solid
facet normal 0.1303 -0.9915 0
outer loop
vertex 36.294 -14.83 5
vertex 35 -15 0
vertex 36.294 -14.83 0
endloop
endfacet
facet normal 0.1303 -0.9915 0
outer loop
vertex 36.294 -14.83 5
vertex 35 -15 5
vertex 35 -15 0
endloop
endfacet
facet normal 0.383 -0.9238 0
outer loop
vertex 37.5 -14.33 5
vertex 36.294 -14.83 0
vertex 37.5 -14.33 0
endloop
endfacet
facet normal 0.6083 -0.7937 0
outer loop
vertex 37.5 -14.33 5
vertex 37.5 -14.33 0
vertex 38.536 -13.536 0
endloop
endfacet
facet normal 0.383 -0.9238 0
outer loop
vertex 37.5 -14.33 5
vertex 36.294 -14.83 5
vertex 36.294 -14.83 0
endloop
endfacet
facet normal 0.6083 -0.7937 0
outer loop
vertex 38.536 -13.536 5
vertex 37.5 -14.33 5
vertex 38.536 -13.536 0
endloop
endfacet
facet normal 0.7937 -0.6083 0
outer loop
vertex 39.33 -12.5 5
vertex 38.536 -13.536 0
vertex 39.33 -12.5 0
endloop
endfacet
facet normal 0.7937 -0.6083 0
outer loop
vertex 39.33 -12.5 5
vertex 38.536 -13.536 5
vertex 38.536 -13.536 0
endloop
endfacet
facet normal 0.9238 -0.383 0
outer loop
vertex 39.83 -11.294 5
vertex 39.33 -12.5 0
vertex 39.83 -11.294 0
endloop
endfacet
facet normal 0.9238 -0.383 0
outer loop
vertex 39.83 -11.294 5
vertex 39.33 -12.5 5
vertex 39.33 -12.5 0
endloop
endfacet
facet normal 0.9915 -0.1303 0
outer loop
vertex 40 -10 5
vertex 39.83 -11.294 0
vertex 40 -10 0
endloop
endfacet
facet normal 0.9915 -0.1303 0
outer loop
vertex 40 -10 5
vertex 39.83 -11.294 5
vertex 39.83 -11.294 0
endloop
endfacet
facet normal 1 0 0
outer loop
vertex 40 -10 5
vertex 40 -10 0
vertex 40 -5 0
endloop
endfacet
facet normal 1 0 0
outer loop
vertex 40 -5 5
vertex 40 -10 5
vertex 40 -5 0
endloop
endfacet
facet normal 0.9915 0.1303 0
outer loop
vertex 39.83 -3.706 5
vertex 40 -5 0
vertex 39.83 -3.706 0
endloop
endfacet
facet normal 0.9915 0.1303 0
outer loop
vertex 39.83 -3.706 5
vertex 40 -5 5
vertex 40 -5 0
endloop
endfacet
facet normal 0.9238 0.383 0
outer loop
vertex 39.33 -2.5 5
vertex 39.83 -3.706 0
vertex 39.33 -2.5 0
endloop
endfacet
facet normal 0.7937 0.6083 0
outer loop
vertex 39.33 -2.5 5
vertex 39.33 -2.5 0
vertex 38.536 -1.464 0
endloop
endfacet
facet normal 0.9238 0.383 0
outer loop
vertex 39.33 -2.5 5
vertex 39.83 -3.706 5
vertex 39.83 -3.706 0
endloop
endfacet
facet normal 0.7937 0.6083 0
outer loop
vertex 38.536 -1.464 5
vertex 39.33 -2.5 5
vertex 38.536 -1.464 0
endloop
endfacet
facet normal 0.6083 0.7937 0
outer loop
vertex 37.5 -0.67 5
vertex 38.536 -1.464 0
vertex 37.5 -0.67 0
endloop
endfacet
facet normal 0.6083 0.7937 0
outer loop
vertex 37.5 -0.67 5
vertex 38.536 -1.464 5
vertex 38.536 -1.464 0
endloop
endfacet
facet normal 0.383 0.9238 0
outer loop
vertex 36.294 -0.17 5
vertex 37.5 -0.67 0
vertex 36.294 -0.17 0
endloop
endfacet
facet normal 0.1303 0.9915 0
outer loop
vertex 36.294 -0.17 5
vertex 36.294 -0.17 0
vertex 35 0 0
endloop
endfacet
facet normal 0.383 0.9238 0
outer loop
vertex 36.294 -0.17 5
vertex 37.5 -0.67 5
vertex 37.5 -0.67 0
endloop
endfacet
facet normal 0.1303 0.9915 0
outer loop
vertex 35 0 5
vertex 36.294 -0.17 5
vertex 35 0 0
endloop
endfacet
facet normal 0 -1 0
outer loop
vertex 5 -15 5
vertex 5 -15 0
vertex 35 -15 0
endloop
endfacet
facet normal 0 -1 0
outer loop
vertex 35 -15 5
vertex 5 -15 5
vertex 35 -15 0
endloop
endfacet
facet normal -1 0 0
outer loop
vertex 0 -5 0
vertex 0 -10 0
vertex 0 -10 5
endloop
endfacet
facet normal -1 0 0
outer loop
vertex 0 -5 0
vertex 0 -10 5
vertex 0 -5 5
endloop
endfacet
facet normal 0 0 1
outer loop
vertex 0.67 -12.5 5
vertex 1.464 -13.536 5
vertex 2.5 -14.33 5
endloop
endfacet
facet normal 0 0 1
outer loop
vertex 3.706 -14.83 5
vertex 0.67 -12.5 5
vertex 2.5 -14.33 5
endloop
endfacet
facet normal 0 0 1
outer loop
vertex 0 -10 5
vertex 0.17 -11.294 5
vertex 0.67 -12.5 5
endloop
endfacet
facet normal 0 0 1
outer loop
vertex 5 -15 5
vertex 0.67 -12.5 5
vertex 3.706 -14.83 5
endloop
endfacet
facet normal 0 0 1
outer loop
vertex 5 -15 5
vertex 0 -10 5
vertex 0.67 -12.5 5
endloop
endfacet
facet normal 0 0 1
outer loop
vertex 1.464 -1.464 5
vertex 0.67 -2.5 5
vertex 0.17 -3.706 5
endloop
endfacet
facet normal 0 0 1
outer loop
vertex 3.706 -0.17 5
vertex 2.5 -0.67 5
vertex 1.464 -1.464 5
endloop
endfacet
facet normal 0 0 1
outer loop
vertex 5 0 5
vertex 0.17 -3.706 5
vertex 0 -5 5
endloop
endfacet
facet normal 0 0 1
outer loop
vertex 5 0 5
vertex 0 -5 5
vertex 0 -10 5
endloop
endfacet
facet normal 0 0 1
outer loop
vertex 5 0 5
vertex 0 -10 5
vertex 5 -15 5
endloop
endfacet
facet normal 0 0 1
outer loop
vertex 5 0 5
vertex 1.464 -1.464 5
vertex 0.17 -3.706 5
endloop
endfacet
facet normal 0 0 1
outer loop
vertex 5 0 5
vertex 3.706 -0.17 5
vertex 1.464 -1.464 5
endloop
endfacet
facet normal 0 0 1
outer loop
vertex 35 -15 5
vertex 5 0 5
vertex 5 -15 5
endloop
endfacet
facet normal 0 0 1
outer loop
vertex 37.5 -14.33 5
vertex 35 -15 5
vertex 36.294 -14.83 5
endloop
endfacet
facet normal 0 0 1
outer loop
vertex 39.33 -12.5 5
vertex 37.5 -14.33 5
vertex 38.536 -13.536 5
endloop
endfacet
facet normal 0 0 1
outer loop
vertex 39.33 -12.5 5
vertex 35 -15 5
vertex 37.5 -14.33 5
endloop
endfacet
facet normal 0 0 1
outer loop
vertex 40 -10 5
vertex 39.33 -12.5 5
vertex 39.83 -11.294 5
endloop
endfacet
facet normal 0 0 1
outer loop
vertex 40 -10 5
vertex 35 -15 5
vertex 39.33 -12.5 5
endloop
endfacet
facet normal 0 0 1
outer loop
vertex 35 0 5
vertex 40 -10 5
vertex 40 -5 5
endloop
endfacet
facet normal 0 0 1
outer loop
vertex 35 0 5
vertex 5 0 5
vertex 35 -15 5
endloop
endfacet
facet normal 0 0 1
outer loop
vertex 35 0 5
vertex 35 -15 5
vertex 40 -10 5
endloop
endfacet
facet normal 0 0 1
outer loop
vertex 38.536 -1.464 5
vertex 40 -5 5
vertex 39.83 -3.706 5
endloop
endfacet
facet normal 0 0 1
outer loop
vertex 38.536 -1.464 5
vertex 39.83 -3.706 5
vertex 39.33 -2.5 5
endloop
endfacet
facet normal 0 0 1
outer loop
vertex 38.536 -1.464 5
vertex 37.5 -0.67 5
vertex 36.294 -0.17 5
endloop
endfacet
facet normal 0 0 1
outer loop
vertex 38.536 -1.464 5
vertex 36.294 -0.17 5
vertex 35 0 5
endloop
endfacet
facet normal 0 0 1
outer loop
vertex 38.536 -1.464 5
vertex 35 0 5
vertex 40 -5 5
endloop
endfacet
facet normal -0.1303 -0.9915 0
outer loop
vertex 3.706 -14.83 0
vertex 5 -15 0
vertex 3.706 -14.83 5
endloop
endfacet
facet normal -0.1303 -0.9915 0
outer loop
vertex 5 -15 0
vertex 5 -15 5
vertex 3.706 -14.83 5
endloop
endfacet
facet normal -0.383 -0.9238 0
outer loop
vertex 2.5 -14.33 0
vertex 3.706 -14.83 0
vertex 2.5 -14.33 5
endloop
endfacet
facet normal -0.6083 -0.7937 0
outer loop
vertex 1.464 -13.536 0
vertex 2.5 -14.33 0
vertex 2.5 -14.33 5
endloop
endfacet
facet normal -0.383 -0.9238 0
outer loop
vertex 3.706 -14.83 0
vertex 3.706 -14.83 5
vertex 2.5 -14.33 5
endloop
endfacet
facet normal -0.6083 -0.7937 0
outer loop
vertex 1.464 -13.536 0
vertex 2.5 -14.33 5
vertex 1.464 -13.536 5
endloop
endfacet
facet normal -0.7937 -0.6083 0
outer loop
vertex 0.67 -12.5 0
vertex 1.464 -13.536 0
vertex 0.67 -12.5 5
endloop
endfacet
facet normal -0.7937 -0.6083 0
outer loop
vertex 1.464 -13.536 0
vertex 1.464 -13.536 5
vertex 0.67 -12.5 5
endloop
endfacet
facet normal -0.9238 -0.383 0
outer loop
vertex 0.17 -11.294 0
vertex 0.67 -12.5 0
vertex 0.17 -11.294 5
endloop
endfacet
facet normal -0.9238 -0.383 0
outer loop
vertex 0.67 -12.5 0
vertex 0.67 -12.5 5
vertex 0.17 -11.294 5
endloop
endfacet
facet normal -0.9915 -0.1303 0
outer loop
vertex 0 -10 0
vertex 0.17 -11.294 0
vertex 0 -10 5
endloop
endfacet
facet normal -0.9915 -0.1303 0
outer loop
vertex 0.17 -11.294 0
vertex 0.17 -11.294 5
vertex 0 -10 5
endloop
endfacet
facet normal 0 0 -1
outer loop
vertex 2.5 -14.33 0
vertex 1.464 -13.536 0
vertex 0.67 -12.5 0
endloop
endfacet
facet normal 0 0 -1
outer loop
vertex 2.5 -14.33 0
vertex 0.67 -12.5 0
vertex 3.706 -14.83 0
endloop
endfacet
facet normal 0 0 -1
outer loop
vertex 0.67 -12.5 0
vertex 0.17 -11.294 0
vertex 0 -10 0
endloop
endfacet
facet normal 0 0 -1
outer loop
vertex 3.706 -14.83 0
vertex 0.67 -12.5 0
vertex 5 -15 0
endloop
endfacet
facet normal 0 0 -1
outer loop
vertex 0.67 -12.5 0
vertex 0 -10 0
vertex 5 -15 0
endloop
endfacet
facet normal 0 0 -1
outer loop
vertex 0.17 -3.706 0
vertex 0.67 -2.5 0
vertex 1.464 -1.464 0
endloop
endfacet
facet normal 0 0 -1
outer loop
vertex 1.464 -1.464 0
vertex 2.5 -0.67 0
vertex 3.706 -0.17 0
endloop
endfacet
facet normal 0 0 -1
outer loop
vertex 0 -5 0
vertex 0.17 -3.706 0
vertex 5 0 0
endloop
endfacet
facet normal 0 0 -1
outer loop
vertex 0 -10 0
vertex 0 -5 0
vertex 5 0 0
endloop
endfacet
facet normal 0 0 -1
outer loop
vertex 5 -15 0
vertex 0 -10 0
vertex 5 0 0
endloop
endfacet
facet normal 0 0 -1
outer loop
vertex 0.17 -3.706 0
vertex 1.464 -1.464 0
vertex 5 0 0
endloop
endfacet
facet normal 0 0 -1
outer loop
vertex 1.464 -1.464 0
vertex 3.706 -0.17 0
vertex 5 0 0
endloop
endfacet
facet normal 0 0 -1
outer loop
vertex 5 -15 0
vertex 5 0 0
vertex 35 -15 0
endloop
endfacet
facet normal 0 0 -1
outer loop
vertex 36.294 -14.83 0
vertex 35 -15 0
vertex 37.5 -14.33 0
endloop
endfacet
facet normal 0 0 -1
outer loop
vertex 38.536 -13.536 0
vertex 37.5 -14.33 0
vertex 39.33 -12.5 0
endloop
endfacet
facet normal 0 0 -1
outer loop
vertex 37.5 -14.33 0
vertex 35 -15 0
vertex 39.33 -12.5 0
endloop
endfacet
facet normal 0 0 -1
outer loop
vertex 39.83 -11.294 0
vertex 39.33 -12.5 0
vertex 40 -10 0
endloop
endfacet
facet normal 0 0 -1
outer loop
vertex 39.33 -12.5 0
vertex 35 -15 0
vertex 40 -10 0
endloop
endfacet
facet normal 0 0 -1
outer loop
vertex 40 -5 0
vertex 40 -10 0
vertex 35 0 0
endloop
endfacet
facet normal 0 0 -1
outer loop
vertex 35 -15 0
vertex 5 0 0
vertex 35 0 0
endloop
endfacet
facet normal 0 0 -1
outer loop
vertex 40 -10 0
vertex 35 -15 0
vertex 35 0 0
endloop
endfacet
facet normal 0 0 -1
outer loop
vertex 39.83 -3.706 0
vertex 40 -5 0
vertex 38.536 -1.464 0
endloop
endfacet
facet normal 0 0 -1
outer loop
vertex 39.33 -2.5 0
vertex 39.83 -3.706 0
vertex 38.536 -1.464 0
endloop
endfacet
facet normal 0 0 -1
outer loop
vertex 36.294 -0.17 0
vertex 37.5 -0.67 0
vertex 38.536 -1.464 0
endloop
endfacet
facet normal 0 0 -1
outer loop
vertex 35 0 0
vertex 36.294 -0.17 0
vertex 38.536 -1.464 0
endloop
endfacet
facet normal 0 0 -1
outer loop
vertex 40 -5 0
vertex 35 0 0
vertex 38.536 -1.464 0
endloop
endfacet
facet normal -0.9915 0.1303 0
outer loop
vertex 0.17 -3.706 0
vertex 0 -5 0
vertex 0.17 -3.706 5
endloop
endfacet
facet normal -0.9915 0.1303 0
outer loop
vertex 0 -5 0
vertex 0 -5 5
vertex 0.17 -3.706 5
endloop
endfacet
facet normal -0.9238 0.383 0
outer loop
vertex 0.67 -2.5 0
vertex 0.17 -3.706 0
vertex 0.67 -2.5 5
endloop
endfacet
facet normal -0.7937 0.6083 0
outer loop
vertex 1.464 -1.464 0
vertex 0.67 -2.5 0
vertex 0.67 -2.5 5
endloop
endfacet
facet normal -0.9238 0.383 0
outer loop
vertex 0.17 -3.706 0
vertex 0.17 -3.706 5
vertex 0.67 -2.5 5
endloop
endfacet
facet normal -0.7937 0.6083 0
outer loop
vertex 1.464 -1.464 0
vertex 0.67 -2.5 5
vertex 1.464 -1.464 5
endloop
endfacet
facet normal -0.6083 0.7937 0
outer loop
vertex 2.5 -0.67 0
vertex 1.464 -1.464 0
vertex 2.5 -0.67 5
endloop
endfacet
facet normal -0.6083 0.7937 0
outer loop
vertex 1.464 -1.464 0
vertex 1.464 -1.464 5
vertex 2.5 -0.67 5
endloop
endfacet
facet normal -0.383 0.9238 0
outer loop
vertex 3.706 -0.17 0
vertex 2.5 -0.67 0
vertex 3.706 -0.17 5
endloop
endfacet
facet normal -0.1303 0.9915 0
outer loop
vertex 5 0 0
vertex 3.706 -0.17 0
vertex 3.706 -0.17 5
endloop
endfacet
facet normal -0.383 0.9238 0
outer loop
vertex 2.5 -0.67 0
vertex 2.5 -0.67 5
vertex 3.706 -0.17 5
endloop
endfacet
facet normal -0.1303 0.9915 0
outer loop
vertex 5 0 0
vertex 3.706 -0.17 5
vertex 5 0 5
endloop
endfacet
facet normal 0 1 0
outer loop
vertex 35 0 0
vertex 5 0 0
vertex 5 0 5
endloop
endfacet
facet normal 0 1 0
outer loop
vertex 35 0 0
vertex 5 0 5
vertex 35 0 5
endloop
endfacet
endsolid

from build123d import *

# Parameters (mm, degrees)
F0_W     = 40
F0_H     = 15
F1_DEPTH = 5
F2_R     = 5
F3_R     = 5


with BuildPart() as f1:
    # F0 (on Top) → F1 (new body)
    with BuildSketch(Plane.XY):
        with Locations((20, -7.5)):
            Rectangle(F0_W, F0_H)
    extrude(amount=F1_DEPTH)

    # F2
    f2_edges = [f1.edges().sort_by_distance(p)[0] for p in [
        (40, -15, 2.5),
        (40, 0, 2.5),
    ]]
    fillet(f2_edges, radius=F2_R)

    # F3
    f3_edges = [f1.edges().sort_by_distance(p)[0] for p in [
        (0, -15, 2.5),
        (0, 0, 2.5),
    ]]
    fillet(f3_edges, radius=F3_R)


solid = f1.part
